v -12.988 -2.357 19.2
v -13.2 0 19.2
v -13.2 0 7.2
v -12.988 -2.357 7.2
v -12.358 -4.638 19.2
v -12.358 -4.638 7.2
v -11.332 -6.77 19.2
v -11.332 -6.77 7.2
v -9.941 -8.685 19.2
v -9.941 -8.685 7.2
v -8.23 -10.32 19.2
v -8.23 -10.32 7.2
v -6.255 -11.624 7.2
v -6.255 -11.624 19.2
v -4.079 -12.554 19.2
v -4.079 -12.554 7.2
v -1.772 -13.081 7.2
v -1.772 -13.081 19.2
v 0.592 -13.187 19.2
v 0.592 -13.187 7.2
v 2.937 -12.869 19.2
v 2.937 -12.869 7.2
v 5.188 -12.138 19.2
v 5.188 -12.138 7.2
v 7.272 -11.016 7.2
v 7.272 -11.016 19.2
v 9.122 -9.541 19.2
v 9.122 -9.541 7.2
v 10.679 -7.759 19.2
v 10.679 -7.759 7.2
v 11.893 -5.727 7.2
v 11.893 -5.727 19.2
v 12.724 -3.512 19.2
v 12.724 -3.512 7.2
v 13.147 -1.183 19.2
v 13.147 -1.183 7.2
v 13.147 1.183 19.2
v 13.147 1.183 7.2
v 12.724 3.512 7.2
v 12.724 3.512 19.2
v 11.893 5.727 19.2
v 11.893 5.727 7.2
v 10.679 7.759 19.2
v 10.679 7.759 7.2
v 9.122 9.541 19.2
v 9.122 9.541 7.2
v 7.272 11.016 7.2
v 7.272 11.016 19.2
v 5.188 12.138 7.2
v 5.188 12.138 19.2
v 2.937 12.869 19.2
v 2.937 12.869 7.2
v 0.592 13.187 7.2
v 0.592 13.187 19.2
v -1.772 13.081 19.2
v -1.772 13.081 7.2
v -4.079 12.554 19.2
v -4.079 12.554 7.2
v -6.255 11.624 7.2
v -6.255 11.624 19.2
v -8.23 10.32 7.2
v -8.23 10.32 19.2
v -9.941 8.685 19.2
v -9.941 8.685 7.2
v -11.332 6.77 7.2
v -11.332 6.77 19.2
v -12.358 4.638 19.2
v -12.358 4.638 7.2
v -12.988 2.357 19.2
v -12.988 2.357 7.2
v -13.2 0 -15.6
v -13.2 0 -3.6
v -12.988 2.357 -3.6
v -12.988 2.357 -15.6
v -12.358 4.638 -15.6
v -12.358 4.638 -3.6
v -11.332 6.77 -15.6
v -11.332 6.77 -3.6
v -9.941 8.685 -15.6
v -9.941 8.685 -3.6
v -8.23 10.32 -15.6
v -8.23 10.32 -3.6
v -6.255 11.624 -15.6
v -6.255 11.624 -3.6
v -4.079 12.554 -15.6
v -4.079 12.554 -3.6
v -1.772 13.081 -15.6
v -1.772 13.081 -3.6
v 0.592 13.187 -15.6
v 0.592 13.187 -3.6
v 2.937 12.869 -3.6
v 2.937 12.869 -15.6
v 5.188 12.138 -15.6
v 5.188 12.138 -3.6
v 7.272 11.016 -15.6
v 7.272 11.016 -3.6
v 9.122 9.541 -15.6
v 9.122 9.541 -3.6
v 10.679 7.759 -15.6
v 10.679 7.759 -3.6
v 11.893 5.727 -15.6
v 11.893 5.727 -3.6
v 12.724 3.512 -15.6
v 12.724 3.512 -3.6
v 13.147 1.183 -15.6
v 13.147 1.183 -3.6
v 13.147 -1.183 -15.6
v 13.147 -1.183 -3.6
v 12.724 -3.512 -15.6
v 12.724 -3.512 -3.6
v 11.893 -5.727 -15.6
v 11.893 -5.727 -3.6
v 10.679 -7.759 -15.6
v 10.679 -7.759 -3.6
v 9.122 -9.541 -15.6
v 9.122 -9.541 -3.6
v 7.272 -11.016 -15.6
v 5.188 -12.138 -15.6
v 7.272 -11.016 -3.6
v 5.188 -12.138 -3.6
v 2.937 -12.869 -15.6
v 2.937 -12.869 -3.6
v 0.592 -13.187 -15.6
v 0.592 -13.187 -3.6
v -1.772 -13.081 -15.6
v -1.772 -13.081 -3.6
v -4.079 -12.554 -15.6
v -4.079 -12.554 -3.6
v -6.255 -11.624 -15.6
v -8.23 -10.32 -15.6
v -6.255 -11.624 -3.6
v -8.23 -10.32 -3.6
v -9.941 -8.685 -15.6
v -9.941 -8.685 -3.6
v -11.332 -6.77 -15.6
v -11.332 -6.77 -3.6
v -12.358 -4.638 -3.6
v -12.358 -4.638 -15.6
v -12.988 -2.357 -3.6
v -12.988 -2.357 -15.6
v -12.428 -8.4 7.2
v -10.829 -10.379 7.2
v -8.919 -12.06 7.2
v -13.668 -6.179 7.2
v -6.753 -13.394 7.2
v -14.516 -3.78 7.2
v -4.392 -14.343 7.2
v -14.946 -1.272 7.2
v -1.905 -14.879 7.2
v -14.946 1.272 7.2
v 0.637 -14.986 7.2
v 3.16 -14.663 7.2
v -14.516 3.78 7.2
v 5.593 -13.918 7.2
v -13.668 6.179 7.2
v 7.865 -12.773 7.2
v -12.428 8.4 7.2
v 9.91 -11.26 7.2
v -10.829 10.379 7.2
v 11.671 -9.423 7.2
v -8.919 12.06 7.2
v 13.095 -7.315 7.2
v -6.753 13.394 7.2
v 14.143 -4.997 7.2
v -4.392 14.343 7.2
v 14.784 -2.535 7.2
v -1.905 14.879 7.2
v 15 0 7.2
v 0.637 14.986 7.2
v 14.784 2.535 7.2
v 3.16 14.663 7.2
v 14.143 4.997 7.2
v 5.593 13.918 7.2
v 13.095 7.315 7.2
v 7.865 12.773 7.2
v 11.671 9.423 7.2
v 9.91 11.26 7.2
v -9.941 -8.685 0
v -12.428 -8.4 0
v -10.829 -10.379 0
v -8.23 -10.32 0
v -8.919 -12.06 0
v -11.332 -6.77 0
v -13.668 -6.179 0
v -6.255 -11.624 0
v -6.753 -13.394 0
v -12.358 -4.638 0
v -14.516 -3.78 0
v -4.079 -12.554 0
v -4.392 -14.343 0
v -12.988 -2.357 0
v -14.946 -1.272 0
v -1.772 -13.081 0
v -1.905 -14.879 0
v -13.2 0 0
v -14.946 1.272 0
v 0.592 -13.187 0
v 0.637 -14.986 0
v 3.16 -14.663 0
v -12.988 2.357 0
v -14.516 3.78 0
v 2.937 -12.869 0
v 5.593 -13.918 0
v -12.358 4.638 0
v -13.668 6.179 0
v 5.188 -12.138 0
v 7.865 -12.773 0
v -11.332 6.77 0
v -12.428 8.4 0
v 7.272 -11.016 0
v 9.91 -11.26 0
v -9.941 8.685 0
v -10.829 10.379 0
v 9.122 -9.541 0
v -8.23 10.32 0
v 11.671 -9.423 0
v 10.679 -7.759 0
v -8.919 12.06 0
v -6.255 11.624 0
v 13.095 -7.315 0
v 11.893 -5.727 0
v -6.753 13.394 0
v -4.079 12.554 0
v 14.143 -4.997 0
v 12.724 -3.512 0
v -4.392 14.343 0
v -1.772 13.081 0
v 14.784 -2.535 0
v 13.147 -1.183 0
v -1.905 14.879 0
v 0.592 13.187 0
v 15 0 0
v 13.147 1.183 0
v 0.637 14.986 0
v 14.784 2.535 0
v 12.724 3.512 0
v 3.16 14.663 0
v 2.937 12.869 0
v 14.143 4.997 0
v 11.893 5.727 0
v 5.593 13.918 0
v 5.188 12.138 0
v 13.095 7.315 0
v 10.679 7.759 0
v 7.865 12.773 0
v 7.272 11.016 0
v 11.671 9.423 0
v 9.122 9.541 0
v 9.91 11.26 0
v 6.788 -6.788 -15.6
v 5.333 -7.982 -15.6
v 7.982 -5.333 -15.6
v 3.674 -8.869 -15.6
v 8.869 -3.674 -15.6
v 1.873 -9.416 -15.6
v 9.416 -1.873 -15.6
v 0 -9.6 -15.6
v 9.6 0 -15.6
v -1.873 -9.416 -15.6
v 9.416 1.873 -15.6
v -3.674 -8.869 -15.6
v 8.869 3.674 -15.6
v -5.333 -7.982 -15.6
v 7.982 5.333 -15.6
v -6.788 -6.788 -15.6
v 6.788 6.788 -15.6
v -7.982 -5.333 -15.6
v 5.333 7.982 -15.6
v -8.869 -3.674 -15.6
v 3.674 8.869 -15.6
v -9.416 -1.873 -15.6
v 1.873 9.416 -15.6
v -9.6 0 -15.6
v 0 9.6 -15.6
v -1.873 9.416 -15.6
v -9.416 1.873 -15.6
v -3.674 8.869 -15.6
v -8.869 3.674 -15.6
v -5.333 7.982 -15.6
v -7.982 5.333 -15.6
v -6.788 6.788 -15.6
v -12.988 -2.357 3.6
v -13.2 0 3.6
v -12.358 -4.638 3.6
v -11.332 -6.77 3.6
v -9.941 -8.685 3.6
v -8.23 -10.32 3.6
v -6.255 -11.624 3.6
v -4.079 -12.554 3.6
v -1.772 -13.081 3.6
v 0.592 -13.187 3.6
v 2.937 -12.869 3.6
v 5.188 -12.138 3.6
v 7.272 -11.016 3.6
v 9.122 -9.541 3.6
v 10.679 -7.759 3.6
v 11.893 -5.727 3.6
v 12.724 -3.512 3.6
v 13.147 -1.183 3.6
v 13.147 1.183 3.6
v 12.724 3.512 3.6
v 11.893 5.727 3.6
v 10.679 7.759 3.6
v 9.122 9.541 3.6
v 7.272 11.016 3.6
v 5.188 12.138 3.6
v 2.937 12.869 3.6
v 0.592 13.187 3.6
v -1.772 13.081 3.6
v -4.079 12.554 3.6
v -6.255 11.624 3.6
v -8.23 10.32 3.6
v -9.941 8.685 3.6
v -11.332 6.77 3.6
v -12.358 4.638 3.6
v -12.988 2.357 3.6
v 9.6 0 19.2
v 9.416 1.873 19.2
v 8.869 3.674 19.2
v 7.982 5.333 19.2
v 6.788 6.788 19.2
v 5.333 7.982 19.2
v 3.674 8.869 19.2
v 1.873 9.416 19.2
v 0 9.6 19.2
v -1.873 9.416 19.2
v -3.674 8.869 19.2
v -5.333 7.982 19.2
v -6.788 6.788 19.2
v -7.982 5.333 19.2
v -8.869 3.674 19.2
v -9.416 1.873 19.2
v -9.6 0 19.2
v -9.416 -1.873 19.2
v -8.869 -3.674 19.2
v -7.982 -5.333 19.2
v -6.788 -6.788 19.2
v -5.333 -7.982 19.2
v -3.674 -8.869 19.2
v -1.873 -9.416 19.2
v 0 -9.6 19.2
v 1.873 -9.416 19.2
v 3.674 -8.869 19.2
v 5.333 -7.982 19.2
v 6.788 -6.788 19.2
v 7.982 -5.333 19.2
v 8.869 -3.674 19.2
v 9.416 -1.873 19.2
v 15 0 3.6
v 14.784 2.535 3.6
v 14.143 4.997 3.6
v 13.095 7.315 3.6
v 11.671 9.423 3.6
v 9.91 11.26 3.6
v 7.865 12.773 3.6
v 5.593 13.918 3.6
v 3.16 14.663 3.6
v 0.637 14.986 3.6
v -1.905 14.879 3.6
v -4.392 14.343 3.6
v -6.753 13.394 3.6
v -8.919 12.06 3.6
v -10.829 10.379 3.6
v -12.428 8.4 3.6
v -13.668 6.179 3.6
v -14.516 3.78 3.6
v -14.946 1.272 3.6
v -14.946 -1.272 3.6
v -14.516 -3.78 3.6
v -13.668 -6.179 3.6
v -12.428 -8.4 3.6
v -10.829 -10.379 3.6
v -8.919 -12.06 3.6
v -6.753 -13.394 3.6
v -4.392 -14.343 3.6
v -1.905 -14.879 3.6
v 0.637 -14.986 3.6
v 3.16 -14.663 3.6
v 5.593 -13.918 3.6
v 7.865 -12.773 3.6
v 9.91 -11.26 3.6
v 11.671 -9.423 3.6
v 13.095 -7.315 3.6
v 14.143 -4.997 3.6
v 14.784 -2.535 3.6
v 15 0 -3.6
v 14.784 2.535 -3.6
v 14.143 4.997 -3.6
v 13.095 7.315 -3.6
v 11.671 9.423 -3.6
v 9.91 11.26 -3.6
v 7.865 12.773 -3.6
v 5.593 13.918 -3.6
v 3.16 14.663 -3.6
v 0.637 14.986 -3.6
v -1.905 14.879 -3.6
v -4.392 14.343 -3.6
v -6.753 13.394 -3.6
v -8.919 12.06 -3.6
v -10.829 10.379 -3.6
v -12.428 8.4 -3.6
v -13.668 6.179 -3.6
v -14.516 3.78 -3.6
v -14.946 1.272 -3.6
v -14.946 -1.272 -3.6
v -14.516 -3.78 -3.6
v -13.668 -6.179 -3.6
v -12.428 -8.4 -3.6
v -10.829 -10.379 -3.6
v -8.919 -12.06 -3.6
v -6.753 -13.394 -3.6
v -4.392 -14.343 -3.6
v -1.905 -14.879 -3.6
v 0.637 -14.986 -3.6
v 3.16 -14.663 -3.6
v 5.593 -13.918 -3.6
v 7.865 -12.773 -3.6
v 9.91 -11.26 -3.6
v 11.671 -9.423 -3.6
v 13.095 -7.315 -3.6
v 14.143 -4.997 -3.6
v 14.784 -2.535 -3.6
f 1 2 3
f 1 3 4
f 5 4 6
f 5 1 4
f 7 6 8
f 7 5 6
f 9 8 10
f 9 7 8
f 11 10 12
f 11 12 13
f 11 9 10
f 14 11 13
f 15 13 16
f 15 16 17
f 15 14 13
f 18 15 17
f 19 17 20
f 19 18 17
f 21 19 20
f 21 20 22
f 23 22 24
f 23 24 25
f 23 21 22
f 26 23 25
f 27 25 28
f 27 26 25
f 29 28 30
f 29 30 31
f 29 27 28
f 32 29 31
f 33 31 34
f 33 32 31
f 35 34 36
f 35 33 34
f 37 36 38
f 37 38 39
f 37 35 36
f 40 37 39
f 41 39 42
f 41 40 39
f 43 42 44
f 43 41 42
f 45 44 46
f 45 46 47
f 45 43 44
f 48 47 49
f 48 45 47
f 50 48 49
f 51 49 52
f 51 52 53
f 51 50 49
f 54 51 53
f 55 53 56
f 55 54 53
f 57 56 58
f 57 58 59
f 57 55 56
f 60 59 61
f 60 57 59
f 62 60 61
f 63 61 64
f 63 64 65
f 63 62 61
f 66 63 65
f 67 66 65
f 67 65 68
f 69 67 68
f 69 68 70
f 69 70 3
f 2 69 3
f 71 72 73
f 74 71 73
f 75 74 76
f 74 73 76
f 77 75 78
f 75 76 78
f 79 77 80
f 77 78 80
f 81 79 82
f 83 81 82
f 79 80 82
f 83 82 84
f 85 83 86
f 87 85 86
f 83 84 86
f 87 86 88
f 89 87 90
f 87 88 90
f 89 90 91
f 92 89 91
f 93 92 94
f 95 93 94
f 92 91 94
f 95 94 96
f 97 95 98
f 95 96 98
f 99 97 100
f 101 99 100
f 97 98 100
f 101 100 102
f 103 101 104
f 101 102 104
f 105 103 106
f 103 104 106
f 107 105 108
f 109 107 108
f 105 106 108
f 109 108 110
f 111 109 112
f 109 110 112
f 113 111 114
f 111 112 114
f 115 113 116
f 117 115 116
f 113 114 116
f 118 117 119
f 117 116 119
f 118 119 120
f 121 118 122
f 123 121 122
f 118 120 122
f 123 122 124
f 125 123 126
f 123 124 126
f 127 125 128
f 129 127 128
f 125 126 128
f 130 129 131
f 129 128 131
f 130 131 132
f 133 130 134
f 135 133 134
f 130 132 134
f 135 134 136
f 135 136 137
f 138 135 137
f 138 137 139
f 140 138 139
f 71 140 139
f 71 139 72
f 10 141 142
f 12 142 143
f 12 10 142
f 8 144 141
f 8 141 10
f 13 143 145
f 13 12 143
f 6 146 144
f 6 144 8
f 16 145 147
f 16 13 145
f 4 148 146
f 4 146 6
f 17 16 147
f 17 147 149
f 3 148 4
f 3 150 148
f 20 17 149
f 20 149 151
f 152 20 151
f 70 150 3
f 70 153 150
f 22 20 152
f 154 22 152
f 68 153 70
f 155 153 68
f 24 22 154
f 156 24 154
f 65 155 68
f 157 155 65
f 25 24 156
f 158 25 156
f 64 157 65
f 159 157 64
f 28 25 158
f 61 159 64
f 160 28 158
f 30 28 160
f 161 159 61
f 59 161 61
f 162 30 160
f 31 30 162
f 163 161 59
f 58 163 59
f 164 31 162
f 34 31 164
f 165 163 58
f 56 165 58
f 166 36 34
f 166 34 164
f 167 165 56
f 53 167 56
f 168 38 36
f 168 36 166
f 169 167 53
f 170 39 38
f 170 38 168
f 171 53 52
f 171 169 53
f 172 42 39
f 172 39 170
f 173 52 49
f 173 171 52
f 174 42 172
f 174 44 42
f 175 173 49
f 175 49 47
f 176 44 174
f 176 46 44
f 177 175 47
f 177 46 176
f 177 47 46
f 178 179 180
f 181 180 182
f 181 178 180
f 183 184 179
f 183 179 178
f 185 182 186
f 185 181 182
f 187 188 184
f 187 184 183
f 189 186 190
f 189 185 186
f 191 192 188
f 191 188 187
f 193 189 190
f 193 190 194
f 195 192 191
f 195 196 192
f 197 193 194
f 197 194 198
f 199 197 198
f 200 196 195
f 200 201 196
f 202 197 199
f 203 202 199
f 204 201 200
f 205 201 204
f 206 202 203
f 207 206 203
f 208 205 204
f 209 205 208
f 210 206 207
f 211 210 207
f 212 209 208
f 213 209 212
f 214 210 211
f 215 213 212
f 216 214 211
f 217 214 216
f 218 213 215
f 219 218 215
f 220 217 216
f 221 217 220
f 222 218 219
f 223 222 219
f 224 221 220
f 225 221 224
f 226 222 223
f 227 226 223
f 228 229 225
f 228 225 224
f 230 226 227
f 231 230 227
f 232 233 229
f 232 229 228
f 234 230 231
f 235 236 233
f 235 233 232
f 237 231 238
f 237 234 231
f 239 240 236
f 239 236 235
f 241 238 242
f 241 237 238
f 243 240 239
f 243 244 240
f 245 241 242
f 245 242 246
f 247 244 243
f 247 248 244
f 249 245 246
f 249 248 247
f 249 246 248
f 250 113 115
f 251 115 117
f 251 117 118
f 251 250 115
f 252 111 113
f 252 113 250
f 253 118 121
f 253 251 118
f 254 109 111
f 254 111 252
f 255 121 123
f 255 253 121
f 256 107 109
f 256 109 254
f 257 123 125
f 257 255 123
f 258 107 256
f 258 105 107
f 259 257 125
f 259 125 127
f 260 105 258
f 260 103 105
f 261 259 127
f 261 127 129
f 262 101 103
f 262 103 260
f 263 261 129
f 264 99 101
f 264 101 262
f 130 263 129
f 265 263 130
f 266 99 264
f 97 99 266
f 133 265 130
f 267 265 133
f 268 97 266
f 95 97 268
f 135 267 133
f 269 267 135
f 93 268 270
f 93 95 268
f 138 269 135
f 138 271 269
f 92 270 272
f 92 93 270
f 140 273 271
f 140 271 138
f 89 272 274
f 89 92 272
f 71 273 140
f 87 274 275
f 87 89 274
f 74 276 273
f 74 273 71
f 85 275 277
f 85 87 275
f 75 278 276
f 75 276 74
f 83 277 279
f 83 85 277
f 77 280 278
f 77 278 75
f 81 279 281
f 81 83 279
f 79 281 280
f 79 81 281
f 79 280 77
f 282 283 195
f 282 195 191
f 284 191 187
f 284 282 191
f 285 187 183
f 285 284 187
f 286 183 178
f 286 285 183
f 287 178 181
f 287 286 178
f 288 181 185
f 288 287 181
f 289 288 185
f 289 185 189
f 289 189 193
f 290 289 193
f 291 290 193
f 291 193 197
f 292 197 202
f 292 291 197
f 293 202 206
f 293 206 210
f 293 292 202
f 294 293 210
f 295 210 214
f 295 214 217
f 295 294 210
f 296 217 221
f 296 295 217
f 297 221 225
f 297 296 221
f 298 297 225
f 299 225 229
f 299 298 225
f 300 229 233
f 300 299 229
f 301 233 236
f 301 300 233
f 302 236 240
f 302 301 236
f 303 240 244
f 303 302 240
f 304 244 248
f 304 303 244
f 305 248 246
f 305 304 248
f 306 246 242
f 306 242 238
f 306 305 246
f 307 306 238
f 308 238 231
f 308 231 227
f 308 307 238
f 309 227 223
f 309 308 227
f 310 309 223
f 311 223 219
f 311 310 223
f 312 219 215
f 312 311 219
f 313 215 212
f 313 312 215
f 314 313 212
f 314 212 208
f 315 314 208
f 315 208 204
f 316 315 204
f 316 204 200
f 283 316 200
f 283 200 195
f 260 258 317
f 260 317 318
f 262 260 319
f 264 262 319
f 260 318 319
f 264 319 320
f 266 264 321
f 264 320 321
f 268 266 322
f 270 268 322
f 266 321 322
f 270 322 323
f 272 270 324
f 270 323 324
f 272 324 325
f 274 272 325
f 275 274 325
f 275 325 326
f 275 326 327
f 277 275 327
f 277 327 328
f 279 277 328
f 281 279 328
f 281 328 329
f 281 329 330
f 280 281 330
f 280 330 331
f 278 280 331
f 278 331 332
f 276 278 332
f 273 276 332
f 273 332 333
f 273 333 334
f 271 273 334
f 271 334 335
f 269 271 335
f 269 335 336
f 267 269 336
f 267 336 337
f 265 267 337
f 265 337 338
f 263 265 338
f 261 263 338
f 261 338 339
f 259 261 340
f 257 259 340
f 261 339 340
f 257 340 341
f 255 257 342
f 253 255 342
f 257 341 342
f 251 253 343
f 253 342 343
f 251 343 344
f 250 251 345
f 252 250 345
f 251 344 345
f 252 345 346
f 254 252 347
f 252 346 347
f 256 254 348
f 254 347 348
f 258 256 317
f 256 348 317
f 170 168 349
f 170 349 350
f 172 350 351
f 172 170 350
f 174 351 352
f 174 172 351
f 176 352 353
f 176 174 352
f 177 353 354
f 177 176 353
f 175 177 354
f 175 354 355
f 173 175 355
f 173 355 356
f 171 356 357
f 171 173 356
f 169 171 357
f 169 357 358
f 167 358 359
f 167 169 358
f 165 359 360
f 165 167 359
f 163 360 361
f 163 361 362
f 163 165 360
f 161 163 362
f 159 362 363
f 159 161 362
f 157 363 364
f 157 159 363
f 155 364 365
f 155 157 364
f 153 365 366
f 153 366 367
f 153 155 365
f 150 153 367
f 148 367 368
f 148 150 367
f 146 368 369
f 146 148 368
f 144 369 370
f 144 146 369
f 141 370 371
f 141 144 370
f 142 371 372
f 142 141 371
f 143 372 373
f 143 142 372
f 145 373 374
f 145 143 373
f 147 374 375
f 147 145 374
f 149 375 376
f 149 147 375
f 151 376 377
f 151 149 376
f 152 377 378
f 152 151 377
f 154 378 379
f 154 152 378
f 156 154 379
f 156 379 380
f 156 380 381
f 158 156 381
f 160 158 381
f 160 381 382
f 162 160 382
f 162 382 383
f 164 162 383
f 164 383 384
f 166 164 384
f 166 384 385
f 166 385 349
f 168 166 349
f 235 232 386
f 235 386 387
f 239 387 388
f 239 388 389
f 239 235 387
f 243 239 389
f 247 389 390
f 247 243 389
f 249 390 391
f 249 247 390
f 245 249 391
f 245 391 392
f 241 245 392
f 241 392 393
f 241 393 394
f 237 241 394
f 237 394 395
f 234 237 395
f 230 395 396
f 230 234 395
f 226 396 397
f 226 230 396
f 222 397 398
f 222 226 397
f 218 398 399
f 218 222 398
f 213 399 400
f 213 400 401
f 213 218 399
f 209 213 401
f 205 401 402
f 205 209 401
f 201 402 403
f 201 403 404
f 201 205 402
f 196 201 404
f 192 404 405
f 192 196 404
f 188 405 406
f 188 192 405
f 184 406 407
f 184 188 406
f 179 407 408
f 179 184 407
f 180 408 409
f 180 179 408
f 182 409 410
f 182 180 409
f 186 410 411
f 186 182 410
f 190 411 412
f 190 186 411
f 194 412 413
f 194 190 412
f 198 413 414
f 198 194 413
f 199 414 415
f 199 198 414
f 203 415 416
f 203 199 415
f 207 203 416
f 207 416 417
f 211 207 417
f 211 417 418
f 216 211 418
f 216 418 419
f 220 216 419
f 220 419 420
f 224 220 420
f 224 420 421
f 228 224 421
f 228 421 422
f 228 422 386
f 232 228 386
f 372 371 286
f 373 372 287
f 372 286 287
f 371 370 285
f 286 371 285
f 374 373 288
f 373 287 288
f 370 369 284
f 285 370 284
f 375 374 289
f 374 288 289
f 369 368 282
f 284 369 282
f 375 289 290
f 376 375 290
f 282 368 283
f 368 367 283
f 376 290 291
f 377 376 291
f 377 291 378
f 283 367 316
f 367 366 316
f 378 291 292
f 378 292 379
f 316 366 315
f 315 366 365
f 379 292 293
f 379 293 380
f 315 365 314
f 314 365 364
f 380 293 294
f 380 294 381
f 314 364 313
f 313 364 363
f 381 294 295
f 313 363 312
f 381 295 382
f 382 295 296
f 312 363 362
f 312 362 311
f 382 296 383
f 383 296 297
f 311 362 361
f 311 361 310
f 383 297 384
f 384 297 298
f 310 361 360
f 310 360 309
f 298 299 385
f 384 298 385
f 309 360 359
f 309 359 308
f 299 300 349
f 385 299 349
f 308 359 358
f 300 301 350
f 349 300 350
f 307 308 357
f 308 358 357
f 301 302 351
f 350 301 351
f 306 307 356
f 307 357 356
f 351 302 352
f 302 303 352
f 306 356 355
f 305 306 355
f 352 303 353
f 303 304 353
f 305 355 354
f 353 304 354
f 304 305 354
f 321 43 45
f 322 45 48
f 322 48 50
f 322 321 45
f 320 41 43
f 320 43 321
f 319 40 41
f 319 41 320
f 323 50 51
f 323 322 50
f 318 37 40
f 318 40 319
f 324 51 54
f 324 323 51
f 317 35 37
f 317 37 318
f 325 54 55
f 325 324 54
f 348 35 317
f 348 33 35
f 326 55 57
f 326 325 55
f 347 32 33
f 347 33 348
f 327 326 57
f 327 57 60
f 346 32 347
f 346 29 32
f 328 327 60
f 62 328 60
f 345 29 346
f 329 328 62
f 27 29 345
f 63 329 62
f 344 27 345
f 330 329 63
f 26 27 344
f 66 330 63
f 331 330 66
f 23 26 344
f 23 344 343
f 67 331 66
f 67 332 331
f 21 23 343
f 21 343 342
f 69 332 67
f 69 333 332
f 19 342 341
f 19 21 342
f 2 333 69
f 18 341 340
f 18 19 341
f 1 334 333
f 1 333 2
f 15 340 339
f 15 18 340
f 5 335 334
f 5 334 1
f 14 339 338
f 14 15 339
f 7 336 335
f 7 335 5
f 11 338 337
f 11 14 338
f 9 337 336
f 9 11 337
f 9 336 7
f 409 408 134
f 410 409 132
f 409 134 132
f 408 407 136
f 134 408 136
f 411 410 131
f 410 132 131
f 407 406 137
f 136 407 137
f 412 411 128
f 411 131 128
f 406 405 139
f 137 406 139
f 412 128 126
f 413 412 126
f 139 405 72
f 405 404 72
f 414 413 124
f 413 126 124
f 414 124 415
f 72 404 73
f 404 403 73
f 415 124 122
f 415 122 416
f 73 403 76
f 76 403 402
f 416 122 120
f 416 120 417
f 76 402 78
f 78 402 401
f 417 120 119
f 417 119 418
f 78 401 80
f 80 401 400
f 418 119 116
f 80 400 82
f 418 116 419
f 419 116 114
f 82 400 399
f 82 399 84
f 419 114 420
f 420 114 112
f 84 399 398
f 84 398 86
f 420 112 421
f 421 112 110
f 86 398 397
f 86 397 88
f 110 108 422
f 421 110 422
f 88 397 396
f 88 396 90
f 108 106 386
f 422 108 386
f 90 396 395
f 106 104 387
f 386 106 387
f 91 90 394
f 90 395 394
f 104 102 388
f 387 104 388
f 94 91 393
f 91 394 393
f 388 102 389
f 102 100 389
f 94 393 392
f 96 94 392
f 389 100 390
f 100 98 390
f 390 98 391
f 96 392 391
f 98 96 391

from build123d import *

# Parameters (mm, degrees)
ESQUISSE3_R             = 15
BOSS_EXTRU_2_DEPTH      = 3.6
ESQUISSE4_R             = 13.2
BOSS_EXTRU_3_DEPTH      = 12
BOSS_EXTRU_4_START      = 3.6
ESQUISSE5_R             = 13.2
BOSS_EXTRU_4_DEPTH      = 3.6
BOSS_EXTRU_5_START      = 3.6
ESQUISSE6_R             = 15
BOSS_EXTRU_5_DEPTH      = 3.6
BOSS_EXTRU_6_START      = 12
ESQUISSE7_R             = 13.2
BOSS_EXTRU_6_DEPTH      = 12
ESQUISSE8_R             = 9.6
ENL_V_MAT_EXTRU_2_DEPTH = 123


with BuildPart() as part:
    # Esquisse3 → Boss.-Extru.2 (new body)
    with BuildSketch(Plane.XY):
        Circle(ESQUISSE3_R)
    extrude(amount=-BOSS_EXTRU_2_DEPTH)

    # Esquisse4 → Boss.-Extru.3 (add)
    with BuildSketch(Plane(origin=(0, 0, -3.6), x_dir=(-1, 0, 0), z_dir=(0, 0, -1))):
        Circle(ESQUISSE4_R)
    extrude(amount=BOSS_EXTRU_3_DEPTH)

    # Esquisse5 → Boss.-Extru.4 (add)
    with BuildSketch(Plane.XY.offset(BOSS_EXTRU_4_START)):
        with Locations(Location((0, 0, 0), (0, 0, 180))):
            Circle(ESQUISSE5_R)
    extrude(amount=-BOSS_EXTRU_4_DEPTH)

    # Esquisse6 → Boss.-Extru.5 (add)
    with BuildSketch(Plane.XY.offset(3.6).offset(BOSS_EXTRU_5_START)):
        Circle(ESQUISSE6_R)
    extrude(amount=-BOSS_EXTRU_5_DEPTH)

    # Esquisse7 → Boss.-Extru.6 (add)
    with BuildSketch(Plane.XY.offset(7.2).offset(BOSS_EXTRU_6_START)):
        with Locations(Location((0, 0, 0), (0, 0, 180))):
            Circle(ESQUISSE7_R)
    extrude(amount=-BOSS_EXTRU_6_DEPTH)

    # Esquisse8 → Enlèv. mat.-Extru.2 (cut)
    with BuildSketch(Plane.XY.offset(19.2)):
        Circle(ESQUISSE8_R)
    extrude(amount=-ENL_V_MAT_EXTRU_2_DEPTH, mode=Mode.SUBTRACT)


solid = part.part
